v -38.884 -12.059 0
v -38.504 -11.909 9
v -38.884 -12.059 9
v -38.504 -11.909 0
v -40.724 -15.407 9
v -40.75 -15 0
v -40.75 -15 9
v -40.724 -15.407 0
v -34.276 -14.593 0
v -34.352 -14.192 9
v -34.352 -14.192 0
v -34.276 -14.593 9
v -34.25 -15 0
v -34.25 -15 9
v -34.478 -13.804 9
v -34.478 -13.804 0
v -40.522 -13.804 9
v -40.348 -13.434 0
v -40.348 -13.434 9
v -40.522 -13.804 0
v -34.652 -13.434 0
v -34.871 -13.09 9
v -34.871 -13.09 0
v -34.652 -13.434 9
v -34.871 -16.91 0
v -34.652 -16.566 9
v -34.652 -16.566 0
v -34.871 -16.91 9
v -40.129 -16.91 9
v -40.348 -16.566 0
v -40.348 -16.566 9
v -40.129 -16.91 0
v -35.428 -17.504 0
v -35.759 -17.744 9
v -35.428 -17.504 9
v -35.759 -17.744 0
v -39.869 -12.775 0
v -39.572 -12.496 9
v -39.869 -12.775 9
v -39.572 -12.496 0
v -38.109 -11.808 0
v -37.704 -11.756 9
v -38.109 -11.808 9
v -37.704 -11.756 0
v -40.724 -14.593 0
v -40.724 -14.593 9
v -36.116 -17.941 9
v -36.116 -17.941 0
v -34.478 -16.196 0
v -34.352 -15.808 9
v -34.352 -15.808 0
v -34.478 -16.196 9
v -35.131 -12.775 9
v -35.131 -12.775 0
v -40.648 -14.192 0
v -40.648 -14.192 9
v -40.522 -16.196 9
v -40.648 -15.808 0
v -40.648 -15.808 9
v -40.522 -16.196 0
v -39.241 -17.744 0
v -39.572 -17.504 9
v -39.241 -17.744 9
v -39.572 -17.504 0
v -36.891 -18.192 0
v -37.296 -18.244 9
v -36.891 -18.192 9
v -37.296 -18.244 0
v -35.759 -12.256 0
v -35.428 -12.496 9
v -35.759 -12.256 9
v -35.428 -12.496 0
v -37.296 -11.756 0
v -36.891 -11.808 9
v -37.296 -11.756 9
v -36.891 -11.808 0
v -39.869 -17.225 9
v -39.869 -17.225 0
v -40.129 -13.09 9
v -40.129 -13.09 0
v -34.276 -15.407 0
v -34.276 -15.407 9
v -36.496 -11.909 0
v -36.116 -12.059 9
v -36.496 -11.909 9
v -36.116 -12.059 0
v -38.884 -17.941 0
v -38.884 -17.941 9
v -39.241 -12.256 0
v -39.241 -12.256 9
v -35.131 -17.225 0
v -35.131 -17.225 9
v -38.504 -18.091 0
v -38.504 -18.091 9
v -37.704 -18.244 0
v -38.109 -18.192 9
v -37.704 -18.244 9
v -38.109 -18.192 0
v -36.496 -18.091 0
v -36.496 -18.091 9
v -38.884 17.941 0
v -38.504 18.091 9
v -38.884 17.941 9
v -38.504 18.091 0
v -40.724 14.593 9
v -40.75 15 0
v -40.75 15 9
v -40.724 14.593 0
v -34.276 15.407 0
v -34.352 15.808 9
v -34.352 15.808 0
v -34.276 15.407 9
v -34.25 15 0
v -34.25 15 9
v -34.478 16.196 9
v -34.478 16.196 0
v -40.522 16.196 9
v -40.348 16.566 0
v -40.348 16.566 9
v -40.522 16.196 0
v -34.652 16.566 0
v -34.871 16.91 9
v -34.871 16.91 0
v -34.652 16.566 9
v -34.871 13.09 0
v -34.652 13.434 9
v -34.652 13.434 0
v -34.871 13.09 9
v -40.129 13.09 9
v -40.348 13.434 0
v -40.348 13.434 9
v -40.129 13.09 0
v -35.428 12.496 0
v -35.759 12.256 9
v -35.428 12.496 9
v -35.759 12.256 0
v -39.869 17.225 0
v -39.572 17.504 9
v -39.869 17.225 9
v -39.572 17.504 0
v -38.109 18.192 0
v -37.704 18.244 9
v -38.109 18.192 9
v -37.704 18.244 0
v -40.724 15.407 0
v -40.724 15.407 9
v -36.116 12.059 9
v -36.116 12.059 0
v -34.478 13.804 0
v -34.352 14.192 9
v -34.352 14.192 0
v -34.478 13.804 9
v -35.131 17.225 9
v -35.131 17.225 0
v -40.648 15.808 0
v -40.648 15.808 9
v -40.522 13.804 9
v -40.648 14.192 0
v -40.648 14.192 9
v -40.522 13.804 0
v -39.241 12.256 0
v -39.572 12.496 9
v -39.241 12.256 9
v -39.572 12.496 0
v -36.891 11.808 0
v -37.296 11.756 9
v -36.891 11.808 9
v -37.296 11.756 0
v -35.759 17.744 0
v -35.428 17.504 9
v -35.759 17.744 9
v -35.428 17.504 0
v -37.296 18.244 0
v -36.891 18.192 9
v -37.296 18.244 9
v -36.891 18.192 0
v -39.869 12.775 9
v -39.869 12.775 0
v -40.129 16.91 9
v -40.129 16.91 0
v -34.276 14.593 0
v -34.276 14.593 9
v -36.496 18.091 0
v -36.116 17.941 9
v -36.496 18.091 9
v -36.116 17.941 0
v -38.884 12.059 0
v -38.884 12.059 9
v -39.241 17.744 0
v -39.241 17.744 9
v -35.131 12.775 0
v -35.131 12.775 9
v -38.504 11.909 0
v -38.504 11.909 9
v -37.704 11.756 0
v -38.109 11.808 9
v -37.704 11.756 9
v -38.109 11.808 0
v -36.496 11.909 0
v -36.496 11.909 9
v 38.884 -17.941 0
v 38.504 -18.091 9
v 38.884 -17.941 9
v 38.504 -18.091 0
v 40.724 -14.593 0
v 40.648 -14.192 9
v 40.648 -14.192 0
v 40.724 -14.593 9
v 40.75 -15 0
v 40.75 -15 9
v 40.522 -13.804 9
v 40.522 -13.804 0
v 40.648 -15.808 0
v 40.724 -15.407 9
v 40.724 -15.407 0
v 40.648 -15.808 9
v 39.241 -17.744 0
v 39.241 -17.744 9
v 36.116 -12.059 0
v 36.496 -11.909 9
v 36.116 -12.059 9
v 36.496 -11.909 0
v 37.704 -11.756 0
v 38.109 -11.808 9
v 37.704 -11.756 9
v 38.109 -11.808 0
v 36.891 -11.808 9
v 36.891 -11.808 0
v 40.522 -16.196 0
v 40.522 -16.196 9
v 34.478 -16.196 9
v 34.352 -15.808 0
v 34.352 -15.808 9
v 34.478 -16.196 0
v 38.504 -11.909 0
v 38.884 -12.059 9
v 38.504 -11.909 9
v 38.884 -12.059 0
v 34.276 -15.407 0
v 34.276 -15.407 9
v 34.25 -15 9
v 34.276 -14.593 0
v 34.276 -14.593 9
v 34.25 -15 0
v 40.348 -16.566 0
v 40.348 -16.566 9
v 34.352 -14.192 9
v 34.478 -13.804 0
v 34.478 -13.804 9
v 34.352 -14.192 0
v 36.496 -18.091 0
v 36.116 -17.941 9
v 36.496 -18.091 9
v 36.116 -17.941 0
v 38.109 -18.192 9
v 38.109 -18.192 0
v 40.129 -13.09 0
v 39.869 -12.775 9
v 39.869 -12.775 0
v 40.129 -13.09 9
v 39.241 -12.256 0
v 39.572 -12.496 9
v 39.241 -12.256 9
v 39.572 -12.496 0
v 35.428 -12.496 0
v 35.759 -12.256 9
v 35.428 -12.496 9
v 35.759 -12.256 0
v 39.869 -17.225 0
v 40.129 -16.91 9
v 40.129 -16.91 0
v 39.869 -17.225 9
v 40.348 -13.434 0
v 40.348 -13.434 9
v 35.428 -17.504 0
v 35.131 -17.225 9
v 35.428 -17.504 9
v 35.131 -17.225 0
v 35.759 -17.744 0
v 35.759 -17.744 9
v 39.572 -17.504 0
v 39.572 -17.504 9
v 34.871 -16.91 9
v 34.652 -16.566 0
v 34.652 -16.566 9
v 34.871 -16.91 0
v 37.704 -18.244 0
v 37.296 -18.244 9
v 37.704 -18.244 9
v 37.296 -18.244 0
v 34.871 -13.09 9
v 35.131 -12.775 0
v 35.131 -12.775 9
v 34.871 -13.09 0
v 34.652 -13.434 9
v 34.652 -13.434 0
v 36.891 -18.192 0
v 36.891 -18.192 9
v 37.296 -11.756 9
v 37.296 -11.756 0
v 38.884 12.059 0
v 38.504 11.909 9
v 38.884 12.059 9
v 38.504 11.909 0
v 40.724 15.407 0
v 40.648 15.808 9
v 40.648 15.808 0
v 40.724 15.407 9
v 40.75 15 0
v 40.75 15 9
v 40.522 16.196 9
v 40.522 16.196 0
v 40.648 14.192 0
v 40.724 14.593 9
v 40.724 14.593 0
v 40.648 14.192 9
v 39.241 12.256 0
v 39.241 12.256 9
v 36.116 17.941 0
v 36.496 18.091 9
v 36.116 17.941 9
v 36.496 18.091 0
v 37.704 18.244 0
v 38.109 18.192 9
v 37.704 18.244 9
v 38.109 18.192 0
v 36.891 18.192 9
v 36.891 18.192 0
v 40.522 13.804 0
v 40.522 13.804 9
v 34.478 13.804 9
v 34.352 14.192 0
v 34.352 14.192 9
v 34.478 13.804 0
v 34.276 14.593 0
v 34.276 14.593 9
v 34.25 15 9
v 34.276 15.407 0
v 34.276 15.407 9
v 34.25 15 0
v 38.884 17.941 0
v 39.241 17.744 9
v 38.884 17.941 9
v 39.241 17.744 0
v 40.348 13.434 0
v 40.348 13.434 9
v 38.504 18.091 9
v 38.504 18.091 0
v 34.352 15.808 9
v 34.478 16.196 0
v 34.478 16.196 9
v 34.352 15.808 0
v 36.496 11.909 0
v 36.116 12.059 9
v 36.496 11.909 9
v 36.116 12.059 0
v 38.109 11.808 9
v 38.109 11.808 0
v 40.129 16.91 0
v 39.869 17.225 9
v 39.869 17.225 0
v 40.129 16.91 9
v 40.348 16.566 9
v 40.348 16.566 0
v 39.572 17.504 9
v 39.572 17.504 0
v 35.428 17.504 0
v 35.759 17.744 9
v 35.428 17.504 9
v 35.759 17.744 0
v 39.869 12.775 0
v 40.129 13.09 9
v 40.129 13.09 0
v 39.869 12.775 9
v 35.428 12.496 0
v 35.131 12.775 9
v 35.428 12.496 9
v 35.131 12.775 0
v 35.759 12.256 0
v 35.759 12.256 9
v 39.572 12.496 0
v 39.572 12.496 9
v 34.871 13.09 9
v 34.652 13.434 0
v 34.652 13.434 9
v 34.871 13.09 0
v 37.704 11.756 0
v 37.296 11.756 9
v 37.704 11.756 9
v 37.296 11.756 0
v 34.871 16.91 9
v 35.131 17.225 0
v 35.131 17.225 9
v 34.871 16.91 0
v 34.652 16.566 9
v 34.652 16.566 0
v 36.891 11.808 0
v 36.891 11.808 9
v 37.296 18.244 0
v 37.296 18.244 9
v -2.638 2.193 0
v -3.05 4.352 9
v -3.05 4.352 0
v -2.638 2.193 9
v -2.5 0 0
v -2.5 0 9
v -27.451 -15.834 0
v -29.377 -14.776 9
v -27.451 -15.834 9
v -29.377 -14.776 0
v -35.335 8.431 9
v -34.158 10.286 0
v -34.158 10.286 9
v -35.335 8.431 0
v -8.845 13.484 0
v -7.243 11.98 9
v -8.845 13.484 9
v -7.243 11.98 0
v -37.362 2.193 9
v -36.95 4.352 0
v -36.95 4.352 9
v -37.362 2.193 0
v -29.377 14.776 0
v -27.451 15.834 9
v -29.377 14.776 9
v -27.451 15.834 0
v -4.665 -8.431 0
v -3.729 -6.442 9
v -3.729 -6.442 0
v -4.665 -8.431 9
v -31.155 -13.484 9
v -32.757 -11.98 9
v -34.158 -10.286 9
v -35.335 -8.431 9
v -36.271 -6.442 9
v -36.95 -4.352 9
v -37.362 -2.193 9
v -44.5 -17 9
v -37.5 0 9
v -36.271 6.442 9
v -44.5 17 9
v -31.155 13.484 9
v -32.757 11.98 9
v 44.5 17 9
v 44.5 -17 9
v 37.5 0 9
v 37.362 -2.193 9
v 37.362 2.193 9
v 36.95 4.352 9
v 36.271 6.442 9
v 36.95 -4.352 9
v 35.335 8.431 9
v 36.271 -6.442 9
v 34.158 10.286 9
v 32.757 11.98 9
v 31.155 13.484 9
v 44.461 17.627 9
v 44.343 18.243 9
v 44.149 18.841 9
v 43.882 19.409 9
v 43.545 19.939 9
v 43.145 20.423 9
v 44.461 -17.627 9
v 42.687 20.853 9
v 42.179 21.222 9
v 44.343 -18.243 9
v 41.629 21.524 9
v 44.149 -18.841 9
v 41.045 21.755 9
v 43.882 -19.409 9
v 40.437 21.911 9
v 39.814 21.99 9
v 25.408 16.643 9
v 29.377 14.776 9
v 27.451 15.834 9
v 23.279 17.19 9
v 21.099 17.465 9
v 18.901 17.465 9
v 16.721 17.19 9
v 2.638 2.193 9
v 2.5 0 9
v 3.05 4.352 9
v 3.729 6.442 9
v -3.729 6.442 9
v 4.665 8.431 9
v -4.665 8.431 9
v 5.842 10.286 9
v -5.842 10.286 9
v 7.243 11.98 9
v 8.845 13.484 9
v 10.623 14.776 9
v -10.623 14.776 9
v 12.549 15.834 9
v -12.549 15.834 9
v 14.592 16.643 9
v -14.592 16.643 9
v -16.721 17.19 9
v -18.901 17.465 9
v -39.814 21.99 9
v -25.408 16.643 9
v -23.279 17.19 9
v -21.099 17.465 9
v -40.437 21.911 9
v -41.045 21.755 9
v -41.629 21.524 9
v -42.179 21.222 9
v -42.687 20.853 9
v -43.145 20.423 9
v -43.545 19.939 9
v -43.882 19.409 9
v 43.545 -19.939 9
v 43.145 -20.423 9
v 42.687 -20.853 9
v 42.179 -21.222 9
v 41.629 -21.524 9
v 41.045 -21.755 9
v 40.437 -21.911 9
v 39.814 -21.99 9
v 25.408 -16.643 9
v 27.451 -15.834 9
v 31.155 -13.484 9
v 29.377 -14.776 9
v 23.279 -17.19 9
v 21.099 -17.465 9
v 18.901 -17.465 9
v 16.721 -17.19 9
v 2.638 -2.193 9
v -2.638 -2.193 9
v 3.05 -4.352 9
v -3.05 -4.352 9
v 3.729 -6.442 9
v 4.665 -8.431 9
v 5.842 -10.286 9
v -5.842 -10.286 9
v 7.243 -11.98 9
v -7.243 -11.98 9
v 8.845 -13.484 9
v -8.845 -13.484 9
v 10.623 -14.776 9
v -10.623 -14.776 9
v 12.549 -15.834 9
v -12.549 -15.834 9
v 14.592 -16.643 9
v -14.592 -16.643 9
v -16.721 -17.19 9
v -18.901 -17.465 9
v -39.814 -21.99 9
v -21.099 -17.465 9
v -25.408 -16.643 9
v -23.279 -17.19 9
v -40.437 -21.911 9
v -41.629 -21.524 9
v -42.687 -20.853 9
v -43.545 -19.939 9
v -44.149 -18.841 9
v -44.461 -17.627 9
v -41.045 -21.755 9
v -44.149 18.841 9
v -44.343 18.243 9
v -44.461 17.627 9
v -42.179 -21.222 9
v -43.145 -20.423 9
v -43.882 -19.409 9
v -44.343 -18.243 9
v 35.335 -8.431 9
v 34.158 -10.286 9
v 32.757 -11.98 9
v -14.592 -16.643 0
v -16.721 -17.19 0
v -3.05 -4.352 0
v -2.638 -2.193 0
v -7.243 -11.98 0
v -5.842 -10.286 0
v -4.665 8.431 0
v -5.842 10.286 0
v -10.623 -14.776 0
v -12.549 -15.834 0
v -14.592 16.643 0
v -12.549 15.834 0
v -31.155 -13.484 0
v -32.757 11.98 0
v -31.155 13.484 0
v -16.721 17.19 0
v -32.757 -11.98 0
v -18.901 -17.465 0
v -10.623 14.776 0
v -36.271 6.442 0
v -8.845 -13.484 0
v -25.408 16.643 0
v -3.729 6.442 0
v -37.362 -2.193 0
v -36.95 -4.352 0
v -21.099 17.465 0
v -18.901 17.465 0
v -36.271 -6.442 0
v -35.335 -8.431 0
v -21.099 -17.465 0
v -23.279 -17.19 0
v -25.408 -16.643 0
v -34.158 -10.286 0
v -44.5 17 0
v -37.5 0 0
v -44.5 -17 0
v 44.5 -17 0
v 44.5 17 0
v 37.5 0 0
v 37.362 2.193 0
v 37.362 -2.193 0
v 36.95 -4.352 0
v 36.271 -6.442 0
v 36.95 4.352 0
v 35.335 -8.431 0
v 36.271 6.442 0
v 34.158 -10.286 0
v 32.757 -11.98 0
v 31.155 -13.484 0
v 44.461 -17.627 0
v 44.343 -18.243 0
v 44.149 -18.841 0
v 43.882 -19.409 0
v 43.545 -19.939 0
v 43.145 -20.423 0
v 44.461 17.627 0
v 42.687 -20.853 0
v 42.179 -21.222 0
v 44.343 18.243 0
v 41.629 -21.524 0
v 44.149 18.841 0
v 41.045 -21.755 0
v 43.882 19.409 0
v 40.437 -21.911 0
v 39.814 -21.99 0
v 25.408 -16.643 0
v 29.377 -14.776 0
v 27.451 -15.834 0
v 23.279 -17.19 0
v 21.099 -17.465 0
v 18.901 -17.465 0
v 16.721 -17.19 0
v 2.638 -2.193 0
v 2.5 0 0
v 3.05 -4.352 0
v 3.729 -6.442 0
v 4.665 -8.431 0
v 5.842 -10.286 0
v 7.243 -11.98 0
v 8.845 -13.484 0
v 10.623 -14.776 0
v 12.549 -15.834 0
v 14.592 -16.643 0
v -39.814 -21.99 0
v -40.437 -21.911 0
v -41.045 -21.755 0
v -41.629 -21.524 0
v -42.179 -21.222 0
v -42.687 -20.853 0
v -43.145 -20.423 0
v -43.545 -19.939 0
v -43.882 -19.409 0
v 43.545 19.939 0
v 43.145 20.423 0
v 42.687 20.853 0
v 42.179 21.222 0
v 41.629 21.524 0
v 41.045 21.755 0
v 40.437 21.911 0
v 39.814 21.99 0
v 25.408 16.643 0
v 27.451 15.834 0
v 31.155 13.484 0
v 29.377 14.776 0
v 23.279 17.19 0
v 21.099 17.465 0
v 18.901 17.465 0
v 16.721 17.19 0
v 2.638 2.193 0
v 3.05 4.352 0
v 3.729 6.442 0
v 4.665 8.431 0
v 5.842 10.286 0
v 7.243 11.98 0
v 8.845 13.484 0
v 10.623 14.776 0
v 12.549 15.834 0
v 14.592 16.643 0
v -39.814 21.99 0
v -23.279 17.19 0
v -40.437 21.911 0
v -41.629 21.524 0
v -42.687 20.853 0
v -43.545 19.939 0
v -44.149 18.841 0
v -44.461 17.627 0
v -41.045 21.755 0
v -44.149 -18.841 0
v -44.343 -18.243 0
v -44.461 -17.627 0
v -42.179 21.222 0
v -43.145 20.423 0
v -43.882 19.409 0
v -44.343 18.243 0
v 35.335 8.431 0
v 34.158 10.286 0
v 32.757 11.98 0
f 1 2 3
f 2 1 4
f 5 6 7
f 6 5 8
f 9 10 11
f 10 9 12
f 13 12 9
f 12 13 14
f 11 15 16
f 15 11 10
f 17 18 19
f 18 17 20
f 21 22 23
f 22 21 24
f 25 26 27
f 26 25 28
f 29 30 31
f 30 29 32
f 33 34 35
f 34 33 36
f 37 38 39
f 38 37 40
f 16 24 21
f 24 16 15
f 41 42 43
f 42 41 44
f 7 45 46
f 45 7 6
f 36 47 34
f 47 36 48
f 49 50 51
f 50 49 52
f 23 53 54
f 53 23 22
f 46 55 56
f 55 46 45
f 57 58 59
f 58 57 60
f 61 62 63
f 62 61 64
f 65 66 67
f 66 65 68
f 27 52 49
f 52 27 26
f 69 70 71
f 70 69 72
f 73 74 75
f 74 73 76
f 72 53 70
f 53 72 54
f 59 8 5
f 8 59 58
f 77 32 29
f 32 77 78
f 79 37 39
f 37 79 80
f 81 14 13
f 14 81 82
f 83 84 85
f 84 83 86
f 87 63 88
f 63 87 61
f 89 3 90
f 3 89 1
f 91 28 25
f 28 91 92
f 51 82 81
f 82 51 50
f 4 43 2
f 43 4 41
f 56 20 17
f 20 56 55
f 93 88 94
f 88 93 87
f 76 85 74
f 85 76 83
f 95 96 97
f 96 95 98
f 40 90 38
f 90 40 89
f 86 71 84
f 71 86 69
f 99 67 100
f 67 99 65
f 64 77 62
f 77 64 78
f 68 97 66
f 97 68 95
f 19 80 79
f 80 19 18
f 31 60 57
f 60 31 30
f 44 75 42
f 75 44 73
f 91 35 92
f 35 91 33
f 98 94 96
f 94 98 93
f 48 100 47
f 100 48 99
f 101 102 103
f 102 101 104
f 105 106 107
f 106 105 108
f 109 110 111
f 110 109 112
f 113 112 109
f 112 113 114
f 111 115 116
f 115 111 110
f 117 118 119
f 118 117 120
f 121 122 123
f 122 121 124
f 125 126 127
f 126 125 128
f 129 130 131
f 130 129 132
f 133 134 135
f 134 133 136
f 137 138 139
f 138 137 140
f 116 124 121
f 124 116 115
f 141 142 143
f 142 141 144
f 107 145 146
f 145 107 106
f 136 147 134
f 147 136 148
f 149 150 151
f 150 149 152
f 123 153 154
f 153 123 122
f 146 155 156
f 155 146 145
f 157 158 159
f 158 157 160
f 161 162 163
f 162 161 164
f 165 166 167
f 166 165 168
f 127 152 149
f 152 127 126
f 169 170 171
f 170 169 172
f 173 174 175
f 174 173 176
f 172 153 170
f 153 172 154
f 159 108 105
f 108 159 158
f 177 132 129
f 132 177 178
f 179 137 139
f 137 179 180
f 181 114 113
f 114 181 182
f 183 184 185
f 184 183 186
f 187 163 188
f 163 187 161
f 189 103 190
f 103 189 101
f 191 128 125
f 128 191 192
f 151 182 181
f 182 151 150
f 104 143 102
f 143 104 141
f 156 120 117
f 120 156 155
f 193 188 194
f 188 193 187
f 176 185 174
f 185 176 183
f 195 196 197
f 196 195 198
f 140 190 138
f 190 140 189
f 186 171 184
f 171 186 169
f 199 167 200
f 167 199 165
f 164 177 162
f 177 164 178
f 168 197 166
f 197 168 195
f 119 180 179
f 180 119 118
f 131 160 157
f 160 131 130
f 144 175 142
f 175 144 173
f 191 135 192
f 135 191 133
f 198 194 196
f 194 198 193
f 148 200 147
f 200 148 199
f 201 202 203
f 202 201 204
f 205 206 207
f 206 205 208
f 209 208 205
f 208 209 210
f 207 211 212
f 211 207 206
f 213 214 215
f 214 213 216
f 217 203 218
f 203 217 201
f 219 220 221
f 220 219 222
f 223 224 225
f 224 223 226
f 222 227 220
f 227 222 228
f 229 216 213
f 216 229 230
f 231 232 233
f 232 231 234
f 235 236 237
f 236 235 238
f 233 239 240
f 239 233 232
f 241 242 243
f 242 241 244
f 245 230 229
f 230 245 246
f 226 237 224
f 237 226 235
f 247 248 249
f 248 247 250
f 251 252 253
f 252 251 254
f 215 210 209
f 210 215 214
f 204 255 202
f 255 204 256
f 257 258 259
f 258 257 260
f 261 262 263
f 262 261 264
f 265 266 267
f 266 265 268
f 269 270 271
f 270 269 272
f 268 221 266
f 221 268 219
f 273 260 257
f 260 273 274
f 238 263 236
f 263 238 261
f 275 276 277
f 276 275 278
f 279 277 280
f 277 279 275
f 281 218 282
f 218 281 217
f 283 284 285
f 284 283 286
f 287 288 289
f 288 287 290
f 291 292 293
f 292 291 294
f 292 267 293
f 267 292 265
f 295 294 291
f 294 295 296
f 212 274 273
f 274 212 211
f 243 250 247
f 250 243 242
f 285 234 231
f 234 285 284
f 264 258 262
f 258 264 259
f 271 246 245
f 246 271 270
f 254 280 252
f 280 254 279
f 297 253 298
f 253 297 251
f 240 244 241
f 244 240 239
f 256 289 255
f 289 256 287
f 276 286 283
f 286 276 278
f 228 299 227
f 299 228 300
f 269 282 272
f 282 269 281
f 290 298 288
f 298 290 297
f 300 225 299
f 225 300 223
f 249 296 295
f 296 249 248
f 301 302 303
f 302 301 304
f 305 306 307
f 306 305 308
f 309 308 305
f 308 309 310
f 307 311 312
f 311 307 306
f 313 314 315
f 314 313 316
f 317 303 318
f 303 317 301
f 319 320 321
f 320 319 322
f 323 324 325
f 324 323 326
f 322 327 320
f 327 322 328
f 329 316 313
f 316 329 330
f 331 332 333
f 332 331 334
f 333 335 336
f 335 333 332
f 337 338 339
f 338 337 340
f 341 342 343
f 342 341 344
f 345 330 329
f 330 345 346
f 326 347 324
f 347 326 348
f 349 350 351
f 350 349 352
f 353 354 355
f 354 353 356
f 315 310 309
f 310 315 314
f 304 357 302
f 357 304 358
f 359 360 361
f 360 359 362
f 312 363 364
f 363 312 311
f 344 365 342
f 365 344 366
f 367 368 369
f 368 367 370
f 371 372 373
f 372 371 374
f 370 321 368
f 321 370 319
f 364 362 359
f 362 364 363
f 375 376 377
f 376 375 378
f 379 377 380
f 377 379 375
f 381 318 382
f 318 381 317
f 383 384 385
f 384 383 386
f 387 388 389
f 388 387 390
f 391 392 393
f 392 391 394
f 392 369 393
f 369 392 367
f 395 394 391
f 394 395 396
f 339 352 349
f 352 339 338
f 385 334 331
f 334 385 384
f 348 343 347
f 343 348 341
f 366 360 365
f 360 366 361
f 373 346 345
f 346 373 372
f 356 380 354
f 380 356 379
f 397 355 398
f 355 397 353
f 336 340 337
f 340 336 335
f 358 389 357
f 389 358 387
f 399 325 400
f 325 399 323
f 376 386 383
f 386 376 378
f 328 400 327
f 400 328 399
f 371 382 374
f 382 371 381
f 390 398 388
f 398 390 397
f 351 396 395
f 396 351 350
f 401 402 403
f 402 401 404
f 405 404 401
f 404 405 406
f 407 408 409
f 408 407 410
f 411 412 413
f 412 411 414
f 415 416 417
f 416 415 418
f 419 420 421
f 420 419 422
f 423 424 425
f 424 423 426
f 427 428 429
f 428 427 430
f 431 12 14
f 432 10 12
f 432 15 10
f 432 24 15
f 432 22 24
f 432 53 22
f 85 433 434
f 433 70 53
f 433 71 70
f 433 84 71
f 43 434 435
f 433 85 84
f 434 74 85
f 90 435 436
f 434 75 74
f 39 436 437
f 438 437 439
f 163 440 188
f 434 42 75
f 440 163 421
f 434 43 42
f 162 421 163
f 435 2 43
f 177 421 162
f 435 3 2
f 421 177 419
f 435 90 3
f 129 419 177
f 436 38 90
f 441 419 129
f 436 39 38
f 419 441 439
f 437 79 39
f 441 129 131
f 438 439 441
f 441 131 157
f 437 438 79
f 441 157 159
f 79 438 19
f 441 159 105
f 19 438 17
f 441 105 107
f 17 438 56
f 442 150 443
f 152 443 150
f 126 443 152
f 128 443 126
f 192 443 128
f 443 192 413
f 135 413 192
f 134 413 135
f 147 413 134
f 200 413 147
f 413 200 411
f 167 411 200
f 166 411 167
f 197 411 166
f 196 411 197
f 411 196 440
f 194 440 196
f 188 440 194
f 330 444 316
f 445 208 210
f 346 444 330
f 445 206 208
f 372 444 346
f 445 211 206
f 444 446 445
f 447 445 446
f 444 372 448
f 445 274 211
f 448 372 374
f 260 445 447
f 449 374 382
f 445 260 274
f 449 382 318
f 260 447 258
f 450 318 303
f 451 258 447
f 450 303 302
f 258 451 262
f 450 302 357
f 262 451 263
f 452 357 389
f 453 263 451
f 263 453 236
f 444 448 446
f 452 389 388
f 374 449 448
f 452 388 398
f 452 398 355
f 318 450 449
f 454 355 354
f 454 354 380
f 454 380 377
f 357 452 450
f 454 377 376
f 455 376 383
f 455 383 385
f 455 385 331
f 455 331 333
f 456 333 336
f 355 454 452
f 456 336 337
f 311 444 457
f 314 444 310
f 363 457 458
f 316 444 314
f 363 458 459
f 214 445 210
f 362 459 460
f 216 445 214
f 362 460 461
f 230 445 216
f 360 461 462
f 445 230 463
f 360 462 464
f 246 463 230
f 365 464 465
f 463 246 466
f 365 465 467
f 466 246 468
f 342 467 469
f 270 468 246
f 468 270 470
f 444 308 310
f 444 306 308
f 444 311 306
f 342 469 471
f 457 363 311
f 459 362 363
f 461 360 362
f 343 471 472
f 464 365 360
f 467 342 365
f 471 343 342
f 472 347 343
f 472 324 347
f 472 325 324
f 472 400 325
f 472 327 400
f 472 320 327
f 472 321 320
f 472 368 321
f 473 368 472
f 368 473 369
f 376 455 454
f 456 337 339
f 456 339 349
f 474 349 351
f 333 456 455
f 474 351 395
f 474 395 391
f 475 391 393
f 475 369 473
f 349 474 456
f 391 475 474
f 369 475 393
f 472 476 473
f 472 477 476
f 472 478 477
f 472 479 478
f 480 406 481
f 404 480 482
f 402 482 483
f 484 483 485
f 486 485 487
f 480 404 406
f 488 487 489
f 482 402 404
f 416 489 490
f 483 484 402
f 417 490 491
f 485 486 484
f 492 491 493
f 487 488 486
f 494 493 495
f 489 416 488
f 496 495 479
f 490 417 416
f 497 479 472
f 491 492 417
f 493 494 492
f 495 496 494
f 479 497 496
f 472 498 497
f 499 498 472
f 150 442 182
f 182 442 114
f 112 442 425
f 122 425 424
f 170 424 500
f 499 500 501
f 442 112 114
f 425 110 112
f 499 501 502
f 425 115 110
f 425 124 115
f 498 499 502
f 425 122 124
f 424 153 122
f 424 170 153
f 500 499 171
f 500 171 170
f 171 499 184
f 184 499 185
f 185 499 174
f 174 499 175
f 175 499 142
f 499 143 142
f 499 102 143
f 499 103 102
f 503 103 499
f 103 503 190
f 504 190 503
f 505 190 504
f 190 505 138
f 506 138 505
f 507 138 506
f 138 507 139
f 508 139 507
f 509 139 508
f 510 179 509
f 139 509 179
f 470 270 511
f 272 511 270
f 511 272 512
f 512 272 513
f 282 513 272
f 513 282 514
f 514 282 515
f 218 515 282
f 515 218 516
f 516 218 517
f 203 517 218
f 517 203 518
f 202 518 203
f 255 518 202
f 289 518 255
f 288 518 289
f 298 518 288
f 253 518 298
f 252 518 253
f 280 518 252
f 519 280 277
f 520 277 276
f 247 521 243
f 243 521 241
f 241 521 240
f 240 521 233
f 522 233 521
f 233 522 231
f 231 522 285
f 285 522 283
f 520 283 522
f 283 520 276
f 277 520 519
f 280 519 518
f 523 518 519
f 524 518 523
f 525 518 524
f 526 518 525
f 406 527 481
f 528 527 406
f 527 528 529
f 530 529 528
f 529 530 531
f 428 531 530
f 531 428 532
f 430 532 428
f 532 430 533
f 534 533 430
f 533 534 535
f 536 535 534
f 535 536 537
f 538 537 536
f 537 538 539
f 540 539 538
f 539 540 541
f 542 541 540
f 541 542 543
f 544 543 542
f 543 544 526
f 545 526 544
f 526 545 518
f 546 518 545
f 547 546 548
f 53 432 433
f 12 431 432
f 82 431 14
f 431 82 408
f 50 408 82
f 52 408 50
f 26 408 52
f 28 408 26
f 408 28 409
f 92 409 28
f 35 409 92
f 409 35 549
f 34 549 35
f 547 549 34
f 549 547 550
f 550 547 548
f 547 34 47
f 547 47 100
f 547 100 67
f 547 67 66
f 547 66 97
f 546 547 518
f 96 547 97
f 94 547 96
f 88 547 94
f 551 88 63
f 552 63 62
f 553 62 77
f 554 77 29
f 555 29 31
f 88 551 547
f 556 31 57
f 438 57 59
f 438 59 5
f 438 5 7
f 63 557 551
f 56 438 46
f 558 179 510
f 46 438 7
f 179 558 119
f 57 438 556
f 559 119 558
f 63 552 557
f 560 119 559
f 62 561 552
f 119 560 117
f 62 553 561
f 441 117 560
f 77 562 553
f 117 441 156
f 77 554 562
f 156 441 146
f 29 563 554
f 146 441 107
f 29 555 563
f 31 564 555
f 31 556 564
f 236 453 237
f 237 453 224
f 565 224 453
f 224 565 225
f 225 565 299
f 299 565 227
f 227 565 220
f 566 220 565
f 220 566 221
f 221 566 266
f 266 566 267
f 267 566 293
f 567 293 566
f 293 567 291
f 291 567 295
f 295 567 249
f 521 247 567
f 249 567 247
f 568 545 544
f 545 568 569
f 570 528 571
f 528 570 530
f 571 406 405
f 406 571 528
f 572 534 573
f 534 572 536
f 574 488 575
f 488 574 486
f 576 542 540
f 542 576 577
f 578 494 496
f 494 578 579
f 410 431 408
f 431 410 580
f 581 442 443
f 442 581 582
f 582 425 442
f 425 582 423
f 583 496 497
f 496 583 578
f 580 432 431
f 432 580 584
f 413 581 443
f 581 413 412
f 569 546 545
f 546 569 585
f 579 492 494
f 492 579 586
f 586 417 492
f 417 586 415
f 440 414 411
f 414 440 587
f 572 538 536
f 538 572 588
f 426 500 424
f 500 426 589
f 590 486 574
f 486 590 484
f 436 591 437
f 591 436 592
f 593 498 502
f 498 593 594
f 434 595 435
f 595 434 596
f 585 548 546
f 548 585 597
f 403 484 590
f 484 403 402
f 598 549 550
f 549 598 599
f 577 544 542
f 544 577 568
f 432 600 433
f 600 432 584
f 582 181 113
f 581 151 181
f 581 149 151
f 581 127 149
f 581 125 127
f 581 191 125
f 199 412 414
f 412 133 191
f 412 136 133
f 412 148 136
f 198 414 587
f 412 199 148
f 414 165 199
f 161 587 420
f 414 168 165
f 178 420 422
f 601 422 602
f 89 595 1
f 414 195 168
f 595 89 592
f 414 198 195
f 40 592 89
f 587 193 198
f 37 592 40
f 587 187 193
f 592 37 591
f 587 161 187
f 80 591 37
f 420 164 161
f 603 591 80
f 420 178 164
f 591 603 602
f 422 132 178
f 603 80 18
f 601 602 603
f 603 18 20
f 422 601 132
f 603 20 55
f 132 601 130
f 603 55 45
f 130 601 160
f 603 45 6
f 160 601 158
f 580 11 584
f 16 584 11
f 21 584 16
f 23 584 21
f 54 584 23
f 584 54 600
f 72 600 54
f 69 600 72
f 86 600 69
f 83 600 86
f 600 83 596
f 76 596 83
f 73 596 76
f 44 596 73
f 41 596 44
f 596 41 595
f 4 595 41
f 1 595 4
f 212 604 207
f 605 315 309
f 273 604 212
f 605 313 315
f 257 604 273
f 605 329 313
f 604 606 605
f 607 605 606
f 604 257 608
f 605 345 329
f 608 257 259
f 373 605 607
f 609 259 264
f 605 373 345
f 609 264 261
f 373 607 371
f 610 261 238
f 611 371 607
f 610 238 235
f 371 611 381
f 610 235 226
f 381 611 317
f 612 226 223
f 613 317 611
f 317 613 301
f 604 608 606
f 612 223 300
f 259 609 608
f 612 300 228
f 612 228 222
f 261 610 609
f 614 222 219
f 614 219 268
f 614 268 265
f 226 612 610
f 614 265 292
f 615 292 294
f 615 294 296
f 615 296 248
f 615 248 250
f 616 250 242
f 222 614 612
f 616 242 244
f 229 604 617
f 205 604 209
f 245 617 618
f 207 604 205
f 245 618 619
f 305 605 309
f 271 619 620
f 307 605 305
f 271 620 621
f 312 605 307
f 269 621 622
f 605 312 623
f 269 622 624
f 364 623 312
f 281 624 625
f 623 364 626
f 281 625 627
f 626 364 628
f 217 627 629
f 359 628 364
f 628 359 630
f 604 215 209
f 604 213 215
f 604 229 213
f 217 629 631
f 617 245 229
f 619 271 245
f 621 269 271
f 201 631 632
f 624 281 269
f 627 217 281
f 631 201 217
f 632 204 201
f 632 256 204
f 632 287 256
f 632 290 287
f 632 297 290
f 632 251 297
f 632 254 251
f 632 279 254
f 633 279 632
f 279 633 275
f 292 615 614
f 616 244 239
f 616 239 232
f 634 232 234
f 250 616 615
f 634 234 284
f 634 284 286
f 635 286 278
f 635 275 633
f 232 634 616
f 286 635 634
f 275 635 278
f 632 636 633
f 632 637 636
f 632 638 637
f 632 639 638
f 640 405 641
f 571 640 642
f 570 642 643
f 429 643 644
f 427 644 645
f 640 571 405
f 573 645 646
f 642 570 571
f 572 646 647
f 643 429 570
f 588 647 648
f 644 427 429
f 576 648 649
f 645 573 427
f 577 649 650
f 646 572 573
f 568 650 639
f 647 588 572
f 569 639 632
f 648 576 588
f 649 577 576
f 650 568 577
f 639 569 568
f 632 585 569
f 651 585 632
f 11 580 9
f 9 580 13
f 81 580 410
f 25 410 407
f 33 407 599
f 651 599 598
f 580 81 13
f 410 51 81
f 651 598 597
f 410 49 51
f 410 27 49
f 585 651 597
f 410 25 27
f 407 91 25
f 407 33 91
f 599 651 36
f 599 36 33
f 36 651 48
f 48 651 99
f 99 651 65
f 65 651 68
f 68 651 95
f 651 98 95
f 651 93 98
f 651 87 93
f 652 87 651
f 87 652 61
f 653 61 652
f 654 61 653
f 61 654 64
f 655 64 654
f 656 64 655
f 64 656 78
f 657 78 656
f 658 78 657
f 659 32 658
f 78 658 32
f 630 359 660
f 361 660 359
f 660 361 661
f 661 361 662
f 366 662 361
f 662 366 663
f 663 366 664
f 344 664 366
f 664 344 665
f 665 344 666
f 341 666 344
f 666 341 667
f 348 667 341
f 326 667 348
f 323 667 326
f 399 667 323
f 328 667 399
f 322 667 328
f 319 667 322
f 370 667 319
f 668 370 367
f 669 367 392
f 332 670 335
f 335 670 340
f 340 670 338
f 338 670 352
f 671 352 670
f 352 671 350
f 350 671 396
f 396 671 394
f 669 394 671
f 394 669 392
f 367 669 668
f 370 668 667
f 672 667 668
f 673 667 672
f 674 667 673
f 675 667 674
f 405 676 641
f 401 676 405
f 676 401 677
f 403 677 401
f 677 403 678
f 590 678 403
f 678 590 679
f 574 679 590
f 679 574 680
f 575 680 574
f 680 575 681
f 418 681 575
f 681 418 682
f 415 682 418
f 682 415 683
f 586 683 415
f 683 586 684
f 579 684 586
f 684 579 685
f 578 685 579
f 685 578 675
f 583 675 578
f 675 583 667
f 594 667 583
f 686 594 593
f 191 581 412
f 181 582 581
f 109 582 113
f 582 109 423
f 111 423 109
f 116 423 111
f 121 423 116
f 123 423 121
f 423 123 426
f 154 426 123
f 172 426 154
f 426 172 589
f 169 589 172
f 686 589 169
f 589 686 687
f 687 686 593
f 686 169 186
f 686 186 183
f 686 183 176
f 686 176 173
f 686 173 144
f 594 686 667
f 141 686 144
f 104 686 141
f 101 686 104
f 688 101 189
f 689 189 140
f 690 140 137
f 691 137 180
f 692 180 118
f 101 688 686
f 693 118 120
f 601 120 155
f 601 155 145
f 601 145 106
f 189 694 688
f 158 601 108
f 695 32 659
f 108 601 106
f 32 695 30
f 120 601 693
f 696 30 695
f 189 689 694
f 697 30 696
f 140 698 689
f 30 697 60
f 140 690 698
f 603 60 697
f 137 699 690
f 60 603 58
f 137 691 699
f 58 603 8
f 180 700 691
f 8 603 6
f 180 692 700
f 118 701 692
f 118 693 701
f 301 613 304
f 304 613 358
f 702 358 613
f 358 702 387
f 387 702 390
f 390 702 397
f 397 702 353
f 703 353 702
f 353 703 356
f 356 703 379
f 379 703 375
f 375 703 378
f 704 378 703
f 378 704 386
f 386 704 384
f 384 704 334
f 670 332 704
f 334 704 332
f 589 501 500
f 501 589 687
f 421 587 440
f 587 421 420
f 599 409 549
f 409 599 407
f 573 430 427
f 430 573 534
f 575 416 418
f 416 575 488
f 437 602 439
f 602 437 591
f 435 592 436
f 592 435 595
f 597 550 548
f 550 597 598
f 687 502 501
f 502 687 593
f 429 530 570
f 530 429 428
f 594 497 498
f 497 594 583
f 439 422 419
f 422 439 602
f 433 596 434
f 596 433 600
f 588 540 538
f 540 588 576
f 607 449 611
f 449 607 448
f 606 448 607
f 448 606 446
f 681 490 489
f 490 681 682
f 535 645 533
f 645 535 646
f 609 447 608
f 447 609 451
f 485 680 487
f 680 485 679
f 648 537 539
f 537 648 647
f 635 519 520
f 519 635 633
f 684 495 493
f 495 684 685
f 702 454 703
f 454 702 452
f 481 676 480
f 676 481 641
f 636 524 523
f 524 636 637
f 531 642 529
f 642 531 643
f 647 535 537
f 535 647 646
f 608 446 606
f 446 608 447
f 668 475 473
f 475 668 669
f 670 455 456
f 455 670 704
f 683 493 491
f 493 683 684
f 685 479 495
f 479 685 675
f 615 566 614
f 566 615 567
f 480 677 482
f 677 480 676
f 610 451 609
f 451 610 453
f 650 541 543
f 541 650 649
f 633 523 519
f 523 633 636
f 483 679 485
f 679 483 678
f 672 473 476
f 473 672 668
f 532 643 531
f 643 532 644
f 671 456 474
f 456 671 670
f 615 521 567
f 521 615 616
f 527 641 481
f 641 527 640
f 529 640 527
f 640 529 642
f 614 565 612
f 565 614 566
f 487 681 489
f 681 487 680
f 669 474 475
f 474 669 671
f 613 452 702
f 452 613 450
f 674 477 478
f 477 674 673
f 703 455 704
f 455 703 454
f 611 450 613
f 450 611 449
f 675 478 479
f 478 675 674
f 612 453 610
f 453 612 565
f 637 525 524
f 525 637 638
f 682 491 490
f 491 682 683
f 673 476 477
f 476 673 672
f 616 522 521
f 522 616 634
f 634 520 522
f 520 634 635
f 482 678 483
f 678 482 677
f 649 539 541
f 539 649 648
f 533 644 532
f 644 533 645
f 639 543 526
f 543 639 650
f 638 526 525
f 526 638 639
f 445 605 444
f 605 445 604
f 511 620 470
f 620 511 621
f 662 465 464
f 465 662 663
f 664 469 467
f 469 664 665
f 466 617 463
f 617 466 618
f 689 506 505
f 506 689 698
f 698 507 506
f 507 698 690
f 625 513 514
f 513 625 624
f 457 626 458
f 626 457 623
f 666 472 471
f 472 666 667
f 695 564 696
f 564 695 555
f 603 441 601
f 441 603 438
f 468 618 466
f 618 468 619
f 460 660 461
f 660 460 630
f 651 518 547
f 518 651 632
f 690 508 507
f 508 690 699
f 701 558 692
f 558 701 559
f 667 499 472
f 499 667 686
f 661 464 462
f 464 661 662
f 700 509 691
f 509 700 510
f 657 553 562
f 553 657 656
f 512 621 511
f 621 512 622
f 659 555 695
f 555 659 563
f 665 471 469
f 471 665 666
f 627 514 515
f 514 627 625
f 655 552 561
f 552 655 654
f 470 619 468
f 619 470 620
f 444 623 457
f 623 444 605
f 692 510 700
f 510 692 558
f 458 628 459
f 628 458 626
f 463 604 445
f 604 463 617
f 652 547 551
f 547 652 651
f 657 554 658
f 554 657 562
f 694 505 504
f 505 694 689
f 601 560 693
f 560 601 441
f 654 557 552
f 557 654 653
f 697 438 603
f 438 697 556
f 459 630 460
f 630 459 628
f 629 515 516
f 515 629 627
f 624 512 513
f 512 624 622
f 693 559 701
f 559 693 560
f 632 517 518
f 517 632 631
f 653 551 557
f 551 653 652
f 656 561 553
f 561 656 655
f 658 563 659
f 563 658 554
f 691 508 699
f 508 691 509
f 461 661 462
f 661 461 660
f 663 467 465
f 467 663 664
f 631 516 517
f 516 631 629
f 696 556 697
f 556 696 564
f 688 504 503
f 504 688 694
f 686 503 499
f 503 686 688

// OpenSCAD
$fn = 50;


difference() {
	union() {
		hull() {
			translate(v = [-39.5000000000, 17.0000000000, 0]) {
				cylinder(h = 9, r = 5);
			}
			translate(v = [39.5000000000, 17.0000000000, 0]) {
				cylinder(h = 9, r = 5);
			}
			translate(v = [-39.5000000000, -17.0000000000, 0]) {
				cylinder(h = 9, r = 5);
			}
			translate(v = [39.5000000000, -17.0000000000, 0]) {
				cylinder(h = 9, r = 5);
			}
		}
	}
	union() {
		#translate(v = [-37.5000000000, -15.0000000000, -100.0000000000]) {
			cylinder(h = 200, r = 3.2500000000);
		}
		#translate(v = [-37.5000000000, 15.0000000000, -100.0000000000]) {
			cylinder(h = 200, r = 3.2500000000);
		}
		#translate(v = [37.5000000000, -15.0000000000, -100.0000000000]) {
			cylinder(h = 200, r = 3.2500000000);
		}
		#translate(v = [37.5000000000, 15.0000000000, -100.0000000000]) {
			cylinder(h = 200, r = 3.2500000000);
		}
		#translate(v = [-20.0000000000, 0, 0]) {
			cylinder(h = 9, r = 17.5000000000);
		}
		#translate(v = [20.0000000000, 0, 0]) {
			cylinder(h = 9, r = 17.5000000000);
		}
	}
}
